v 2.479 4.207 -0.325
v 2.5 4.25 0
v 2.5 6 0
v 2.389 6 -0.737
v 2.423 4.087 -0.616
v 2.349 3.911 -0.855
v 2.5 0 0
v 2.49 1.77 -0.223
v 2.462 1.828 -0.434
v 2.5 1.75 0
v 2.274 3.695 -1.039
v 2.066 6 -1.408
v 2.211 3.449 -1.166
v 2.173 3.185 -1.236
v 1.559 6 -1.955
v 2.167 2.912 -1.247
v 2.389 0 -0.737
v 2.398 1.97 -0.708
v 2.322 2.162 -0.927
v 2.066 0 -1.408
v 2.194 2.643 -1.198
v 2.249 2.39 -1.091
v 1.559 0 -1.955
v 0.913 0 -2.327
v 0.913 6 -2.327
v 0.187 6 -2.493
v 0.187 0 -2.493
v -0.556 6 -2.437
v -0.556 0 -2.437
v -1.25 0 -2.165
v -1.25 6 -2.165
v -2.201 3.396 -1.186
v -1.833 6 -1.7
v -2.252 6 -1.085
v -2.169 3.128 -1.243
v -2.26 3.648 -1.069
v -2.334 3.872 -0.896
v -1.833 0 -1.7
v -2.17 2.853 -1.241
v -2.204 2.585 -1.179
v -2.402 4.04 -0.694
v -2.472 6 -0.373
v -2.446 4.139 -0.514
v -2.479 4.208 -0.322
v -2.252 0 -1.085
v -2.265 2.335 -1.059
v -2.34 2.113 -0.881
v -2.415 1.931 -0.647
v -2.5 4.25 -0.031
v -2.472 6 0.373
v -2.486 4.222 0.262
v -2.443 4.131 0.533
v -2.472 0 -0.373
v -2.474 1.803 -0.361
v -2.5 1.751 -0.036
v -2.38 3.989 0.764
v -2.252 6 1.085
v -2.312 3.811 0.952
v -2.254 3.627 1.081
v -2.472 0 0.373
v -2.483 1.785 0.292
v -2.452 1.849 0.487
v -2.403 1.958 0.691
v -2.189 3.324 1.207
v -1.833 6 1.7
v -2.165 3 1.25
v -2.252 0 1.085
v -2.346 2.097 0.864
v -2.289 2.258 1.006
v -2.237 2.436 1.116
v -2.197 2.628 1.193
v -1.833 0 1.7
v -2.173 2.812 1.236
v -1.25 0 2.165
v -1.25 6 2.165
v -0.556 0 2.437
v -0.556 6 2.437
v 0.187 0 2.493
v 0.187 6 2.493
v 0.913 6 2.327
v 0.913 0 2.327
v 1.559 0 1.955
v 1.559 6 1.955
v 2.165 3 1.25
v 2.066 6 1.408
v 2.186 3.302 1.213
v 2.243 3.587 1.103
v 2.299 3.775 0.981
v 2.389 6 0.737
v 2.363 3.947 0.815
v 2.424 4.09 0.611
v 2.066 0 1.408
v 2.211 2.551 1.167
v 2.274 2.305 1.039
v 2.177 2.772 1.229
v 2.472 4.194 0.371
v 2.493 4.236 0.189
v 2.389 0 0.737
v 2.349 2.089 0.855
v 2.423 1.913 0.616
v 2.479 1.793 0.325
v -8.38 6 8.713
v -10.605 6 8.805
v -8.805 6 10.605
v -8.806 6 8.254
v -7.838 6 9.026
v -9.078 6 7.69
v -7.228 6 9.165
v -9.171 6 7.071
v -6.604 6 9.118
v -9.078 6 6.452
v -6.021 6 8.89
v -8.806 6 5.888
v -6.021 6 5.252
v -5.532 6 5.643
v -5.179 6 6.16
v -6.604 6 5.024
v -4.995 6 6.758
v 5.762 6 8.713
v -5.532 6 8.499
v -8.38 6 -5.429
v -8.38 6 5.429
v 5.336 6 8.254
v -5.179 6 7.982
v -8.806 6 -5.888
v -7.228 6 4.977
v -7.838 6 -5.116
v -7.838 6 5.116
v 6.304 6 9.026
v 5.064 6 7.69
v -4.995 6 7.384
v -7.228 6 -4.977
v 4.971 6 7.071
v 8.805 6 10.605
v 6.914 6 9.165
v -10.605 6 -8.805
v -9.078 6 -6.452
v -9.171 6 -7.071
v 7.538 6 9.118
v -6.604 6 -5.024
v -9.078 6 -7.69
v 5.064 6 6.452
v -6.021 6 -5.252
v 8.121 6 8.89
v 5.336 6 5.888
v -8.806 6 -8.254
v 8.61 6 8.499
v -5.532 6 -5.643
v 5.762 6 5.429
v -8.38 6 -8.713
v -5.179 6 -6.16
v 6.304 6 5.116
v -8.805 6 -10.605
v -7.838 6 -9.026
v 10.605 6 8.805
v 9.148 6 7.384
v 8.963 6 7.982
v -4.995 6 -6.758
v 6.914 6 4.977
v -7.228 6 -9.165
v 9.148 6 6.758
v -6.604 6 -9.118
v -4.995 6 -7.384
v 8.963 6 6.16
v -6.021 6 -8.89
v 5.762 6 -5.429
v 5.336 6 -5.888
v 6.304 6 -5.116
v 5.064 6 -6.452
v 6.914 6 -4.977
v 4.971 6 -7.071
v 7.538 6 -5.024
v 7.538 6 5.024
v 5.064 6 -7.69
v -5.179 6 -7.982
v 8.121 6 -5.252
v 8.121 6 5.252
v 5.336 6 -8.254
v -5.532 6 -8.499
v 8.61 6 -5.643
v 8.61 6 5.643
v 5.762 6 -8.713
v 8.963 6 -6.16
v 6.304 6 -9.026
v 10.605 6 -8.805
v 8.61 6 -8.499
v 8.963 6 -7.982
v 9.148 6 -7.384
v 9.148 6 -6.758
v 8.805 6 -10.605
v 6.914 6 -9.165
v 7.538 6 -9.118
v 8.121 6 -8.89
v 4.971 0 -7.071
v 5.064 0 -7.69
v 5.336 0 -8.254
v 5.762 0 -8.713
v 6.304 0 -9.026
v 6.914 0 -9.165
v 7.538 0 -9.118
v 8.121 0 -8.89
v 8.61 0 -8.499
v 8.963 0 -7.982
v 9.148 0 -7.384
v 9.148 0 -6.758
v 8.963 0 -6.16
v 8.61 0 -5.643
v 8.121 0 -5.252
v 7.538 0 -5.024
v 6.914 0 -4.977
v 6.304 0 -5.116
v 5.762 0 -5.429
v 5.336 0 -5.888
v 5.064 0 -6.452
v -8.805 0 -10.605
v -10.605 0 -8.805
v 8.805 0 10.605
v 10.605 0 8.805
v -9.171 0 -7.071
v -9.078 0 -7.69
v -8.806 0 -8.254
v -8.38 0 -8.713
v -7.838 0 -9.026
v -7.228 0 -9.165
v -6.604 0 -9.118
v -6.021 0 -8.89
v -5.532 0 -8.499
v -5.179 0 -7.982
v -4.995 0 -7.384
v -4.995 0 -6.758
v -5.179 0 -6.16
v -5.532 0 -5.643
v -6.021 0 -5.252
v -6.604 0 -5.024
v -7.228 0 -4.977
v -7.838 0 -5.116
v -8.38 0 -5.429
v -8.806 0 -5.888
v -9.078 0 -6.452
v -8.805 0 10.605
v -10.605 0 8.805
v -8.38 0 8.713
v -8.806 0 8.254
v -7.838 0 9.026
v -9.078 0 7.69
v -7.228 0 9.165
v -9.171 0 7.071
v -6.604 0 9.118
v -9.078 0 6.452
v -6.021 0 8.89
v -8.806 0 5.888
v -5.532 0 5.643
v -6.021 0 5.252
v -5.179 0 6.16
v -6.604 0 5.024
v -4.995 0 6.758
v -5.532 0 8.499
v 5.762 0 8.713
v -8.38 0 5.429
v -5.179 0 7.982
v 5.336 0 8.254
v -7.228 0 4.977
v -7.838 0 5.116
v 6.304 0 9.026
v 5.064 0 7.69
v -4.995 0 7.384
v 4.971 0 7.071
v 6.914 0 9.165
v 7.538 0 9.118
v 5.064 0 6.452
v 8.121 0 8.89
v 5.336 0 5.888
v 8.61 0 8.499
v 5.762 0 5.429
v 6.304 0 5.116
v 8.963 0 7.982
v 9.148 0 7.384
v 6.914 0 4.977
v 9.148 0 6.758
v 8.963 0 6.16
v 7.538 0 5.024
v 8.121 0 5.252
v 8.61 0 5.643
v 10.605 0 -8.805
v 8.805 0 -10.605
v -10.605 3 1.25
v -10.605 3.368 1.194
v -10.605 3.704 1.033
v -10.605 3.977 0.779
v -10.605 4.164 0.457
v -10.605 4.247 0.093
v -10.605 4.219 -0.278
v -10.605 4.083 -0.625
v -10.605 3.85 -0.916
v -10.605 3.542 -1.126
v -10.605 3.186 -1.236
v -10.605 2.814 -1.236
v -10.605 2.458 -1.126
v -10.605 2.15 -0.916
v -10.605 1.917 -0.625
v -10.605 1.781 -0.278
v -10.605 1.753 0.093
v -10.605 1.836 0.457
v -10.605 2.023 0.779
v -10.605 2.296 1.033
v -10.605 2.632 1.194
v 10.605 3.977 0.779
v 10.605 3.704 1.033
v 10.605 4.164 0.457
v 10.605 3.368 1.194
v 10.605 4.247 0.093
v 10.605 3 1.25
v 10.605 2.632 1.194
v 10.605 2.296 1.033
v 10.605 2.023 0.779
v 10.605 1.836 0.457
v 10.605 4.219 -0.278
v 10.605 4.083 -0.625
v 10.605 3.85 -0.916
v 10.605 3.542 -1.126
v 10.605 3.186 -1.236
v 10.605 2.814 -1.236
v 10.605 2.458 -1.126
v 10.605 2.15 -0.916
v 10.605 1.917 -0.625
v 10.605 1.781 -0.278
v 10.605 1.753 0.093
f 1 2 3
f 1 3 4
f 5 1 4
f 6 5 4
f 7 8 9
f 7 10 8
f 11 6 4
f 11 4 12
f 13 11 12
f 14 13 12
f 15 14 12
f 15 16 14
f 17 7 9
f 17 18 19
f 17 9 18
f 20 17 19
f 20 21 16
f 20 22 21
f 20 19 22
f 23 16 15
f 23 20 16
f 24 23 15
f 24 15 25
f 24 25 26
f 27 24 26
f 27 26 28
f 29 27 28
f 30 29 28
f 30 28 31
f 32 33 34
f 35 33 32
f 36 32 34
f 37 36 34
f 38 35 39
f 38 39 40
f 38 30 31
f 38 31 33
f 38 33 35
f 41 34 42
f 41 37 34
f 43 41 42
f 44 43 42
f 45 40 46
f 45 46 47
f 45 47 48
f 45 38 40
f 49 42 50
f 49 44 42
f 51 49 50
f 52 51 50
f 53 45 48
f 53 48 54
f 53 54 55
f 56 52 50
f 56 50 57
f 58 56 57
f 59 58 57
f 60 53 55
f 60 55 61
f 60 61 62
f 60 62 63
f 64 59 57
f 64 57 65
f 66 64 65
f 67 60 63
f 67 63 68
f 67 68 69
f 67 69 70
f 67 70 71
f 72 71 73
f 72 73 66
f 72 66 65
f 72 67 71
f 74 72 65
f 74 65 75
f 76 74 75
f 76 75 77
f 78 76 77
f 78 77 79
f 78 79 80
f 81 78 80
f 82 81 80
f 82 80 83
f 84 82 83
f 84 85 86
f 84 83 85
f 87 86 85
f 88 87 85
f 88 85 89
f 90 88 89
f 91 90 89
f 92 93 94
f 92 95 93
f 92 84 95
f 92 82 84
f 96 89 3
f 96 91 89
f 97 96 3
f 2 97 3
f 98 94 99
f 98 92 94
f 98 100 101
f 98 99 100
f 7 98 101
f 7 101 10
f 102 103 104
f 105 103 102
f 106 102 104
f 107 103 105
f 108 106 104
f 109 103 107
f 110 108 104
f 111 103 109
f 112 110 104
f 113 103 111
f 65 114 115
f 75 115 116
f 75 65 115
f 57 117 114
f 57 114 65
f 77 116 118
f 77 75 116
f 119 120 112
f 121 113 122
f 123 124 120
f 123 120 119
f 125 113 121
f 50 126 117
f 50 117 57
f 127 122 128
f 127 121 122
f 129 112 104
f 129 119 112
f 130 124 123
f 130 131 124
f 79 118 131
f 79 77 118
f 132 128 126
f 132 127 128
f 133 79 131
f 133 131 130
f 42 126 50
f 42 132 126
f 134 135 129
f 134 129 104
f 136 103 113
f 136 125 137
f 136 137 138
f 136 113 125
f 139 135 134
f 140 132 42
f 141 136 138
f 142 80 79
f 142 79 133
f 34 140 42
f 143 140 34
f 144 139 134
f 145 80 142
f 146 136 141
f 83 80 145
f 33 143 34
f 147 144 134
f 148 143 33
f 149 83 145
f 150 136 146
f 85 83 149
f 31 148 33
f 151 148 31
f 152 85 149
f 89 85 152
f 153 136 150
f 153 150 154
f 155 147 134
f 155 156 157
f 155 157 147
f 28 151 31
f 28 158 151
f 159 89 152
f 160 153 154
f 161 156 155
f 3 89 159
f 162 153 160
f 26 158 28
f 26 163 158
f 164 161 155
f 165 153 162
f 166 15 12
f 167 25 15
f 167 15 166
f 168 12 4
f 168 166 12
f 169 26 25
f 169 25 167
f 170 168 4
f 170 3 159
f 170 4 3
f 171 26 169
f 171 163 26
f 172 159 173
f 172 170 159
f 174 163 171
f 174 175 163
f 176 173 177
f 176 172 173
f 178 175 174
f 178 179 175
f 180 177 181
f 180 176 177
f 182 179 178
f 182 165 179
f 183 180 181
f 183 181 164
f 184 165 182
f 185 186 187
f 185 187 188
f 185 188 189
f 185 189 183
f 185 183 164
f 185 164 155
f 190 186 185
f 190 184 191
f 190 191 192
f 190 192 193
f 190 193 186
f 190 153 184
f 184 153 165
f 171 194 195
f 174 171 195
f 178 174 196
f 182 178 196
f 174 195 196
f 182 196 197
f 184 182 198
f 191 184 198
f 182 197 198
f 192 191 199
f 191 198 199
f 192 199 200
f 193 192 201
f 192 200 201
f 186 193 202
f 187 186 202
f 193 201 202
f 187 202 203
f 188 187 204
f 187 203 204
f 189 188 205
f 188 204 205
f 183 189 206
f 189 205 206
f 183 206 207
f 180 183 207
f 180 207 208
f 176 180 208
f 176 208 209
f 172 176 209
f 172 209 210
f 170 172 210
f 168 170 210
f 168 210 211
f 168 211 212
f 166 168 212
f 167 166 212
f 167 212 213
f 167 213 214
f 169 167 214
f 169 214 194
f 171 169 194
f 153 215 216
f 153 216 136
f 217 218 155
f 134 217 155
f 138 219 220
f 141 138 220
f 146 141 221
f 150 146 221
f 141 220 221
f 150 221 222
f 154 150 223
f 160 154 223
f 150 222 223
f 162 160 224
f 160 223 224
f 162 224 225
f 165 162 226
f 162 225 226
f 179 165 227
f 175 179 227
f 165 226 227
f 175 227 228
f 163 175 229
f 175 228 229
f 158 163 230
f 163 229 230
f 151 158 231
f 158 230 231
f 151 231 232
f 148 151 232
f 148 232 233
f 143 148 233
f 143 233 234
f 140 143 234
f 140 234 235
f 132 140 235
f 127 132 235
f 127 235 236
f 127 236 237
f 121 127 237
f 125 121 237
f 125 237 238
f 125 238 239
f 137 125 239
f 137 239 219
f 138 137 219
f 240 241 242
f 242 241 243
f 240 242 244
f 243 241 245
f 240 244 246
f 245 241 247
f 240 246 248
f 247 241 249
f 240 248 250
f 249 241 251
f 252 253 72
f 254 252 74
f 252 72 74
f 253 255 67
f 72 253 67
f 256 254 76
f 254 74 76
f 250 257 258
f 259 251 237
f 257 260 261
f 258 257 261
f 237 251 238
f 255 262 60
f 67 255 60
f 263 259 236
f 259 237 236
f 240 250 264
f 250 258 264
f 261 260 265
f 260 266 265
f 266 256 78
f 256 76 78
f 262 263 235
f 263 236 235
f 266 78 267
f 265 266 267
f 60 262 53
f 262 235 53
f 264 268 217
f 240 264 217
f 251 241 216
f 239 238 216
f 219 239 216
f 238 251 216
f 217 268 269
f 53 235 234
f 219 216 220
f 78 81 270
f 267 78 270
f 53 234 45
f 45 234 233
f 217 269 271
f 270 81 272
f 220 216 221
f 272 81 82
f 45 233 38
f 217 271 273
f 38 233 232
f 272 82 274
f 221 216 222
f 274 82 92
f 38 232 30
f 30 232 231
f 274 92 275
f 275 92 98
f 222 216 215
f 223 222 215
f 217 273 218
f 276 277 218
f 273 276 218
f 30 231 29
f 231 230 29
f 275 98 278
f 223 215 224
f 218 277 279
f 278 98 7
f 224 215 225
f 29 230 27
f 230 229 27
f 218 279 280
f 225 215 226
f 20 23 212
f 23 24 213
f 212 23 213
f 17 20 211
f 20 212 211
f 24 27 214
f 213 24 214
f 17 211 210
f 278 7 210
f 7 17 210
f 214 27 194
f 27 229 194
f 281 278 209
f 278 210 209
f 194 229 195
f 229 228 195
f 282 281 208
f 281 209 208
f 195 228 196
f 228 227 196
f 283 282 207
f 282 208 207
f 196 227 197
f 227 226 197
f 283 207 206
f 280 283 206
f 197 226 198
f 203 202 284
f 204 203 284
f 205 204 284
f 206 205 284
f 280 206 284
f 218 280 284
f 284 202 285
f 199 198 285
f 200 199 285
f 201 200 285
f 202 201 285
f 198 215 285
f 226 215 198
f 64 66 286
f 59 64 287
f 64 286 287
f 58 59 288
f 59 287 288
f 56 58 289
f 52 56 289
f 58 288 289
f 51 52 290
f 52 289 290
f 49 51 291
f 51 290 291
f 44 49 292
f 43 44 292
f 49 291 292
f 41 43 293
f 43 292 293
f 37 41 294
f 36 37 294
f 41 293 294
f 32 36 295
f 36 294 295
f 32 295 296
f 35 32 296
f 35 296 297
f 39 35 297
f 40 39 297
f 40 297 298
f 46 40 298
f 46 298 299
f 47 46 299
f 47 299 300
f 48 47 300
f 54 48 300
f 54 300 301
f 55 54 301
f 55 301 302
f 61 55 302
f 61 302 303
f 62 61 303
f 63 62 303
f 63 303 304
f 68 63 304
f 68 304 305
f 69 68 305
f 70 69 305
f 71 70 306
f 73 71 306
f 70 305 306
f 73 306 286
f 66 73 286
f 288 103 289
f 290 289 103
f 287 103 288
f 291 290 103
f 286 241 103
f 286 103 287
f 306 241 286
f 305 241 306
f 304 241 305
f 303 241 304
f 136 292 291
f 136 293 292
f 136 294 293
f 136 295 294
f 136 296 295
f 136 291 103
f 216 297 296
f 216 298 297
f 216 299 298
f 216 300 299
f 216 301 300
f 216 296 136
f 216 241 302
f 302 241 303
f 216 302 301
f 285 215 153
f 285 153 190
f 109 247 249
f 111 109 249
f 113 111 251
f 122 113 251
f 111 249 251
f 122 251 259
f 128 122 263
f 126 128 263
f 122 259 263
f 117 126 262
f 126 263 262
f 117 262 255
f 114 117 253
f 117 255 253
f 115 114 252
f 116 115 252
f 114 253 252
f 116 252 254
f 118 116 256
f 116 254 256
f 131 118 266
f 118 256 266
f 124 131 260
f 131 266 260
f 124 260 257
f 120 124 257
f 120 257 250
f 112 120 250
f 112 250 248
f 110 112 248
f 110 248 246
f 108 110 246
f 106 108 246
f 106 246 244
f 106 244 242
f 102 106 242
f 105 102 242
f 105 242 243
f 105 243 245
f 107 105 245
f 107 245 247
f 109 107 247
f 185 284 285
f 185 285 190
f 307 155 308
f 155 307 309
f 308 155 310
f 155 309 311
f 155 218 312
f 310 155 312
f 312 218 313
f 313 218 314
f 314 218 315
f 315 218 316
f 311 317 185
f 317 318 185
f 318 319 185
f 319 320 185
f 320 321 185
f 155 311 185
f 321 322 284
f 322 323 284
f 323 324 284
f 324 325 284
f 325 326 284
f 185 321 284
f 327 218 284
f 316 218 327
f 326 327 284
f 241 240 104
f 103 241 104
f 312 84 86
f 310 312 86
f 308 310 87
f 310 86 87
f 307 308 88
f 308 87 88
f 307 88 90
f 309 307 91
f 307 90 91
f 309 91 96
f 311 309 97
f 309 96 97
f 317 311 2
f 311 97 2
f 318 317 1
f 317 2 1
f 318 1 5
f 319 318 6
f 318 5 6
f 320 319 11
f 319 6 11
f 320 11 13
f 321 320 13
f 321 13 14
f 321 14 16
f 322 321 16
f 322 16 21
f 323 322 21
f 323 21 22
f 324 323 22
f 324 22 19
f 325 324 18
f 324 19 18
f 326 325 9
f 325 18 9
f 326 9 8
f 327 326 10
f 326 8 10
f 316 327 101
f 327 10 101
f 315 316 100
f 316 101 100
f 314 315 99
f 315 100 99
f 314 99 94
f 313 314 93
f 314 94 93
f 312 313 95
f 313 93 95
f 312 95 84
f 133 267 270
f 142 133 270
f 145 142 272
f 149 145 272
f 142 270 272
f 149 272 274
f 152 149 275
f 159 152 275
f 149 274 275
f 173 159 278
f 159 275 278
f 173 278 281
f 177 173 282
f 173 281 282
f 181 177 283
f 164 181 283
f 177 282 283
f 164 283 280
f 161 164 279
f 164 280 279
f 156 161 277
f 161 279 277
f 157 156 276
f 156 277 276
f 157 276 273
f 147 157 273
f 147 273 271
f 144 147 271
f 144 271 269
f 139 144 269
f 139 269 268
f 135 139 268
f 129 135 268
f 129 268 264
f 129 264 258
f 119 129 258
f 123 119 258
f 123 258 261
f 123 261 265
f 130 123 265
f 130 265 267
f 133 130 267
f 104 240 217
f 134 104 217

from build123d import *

# Parameters (mm, degrees)
SKETCH1_W             = 21.21
SKETCH1_H             = 21.21
SKETCH1_R             = 2.5
BOSS_EXTRUDE1_DEPTH   = 6
M5X0_8_TAPPED_HOLE1_D = 4.2
M3X0_5_TAPPED_HOLE1_D = 2.5
CHAMFER1_SIZE         = 1.8


with BuildPart() as part:
    # Sketch1 → Boss-Extrude1 (new body)
    with BuildSketch(Plane(origin=(0, 0, 0), x_dir=(1, 0, 0), z_dir=(0, 1, 0))):
        Rectangle(SKETCH1_W, SKETCH1_H)
        Circle(SKETCH1_R, mode=Mode.SUBTRACT)
    extrude(amount=BOSS_EXTRUDE1_DEPTH)

    # M5x0.8 Tapped Hole1 (through all)
    with Locations(Plane(origin=(0, 6, 0), x_dir=(1, 0, 0), z_dir=(0, 1, 0))):
        with Locations((-7.071067812, 7.071067812), (-7.071067812, -7.071067812), (7.071067812, -7.071067812), (7.071067812, 7.071067812)):
            Hole(M5X0_8_TAPPED_HOLE1_D / 2)

    # M3x0.5 Tapped Hole1 (through all)
    with Locations(Plane(origin=(10.605, 0, 0), x_dir=(0, 0, -1), z_dir=(1, 0, 0))):
        with Locations((0, 3)):
            Hole(M3X0_5_TAPPED_HOLE1_D / 2)

    # Chamfer1
    chamfer1_edges = [part.edges().sort_by_distance(p)[0] for p in [
        (-10.605, 3, -10.605),
        (10.605, 3, -10.605),
        (10.605, 3, 10.605),
        (-10.605, 3, 10.605),
    ]]
    chamfer(chamfer1_edges, length=CHAMFER1_SIZE)


solid = part.part
